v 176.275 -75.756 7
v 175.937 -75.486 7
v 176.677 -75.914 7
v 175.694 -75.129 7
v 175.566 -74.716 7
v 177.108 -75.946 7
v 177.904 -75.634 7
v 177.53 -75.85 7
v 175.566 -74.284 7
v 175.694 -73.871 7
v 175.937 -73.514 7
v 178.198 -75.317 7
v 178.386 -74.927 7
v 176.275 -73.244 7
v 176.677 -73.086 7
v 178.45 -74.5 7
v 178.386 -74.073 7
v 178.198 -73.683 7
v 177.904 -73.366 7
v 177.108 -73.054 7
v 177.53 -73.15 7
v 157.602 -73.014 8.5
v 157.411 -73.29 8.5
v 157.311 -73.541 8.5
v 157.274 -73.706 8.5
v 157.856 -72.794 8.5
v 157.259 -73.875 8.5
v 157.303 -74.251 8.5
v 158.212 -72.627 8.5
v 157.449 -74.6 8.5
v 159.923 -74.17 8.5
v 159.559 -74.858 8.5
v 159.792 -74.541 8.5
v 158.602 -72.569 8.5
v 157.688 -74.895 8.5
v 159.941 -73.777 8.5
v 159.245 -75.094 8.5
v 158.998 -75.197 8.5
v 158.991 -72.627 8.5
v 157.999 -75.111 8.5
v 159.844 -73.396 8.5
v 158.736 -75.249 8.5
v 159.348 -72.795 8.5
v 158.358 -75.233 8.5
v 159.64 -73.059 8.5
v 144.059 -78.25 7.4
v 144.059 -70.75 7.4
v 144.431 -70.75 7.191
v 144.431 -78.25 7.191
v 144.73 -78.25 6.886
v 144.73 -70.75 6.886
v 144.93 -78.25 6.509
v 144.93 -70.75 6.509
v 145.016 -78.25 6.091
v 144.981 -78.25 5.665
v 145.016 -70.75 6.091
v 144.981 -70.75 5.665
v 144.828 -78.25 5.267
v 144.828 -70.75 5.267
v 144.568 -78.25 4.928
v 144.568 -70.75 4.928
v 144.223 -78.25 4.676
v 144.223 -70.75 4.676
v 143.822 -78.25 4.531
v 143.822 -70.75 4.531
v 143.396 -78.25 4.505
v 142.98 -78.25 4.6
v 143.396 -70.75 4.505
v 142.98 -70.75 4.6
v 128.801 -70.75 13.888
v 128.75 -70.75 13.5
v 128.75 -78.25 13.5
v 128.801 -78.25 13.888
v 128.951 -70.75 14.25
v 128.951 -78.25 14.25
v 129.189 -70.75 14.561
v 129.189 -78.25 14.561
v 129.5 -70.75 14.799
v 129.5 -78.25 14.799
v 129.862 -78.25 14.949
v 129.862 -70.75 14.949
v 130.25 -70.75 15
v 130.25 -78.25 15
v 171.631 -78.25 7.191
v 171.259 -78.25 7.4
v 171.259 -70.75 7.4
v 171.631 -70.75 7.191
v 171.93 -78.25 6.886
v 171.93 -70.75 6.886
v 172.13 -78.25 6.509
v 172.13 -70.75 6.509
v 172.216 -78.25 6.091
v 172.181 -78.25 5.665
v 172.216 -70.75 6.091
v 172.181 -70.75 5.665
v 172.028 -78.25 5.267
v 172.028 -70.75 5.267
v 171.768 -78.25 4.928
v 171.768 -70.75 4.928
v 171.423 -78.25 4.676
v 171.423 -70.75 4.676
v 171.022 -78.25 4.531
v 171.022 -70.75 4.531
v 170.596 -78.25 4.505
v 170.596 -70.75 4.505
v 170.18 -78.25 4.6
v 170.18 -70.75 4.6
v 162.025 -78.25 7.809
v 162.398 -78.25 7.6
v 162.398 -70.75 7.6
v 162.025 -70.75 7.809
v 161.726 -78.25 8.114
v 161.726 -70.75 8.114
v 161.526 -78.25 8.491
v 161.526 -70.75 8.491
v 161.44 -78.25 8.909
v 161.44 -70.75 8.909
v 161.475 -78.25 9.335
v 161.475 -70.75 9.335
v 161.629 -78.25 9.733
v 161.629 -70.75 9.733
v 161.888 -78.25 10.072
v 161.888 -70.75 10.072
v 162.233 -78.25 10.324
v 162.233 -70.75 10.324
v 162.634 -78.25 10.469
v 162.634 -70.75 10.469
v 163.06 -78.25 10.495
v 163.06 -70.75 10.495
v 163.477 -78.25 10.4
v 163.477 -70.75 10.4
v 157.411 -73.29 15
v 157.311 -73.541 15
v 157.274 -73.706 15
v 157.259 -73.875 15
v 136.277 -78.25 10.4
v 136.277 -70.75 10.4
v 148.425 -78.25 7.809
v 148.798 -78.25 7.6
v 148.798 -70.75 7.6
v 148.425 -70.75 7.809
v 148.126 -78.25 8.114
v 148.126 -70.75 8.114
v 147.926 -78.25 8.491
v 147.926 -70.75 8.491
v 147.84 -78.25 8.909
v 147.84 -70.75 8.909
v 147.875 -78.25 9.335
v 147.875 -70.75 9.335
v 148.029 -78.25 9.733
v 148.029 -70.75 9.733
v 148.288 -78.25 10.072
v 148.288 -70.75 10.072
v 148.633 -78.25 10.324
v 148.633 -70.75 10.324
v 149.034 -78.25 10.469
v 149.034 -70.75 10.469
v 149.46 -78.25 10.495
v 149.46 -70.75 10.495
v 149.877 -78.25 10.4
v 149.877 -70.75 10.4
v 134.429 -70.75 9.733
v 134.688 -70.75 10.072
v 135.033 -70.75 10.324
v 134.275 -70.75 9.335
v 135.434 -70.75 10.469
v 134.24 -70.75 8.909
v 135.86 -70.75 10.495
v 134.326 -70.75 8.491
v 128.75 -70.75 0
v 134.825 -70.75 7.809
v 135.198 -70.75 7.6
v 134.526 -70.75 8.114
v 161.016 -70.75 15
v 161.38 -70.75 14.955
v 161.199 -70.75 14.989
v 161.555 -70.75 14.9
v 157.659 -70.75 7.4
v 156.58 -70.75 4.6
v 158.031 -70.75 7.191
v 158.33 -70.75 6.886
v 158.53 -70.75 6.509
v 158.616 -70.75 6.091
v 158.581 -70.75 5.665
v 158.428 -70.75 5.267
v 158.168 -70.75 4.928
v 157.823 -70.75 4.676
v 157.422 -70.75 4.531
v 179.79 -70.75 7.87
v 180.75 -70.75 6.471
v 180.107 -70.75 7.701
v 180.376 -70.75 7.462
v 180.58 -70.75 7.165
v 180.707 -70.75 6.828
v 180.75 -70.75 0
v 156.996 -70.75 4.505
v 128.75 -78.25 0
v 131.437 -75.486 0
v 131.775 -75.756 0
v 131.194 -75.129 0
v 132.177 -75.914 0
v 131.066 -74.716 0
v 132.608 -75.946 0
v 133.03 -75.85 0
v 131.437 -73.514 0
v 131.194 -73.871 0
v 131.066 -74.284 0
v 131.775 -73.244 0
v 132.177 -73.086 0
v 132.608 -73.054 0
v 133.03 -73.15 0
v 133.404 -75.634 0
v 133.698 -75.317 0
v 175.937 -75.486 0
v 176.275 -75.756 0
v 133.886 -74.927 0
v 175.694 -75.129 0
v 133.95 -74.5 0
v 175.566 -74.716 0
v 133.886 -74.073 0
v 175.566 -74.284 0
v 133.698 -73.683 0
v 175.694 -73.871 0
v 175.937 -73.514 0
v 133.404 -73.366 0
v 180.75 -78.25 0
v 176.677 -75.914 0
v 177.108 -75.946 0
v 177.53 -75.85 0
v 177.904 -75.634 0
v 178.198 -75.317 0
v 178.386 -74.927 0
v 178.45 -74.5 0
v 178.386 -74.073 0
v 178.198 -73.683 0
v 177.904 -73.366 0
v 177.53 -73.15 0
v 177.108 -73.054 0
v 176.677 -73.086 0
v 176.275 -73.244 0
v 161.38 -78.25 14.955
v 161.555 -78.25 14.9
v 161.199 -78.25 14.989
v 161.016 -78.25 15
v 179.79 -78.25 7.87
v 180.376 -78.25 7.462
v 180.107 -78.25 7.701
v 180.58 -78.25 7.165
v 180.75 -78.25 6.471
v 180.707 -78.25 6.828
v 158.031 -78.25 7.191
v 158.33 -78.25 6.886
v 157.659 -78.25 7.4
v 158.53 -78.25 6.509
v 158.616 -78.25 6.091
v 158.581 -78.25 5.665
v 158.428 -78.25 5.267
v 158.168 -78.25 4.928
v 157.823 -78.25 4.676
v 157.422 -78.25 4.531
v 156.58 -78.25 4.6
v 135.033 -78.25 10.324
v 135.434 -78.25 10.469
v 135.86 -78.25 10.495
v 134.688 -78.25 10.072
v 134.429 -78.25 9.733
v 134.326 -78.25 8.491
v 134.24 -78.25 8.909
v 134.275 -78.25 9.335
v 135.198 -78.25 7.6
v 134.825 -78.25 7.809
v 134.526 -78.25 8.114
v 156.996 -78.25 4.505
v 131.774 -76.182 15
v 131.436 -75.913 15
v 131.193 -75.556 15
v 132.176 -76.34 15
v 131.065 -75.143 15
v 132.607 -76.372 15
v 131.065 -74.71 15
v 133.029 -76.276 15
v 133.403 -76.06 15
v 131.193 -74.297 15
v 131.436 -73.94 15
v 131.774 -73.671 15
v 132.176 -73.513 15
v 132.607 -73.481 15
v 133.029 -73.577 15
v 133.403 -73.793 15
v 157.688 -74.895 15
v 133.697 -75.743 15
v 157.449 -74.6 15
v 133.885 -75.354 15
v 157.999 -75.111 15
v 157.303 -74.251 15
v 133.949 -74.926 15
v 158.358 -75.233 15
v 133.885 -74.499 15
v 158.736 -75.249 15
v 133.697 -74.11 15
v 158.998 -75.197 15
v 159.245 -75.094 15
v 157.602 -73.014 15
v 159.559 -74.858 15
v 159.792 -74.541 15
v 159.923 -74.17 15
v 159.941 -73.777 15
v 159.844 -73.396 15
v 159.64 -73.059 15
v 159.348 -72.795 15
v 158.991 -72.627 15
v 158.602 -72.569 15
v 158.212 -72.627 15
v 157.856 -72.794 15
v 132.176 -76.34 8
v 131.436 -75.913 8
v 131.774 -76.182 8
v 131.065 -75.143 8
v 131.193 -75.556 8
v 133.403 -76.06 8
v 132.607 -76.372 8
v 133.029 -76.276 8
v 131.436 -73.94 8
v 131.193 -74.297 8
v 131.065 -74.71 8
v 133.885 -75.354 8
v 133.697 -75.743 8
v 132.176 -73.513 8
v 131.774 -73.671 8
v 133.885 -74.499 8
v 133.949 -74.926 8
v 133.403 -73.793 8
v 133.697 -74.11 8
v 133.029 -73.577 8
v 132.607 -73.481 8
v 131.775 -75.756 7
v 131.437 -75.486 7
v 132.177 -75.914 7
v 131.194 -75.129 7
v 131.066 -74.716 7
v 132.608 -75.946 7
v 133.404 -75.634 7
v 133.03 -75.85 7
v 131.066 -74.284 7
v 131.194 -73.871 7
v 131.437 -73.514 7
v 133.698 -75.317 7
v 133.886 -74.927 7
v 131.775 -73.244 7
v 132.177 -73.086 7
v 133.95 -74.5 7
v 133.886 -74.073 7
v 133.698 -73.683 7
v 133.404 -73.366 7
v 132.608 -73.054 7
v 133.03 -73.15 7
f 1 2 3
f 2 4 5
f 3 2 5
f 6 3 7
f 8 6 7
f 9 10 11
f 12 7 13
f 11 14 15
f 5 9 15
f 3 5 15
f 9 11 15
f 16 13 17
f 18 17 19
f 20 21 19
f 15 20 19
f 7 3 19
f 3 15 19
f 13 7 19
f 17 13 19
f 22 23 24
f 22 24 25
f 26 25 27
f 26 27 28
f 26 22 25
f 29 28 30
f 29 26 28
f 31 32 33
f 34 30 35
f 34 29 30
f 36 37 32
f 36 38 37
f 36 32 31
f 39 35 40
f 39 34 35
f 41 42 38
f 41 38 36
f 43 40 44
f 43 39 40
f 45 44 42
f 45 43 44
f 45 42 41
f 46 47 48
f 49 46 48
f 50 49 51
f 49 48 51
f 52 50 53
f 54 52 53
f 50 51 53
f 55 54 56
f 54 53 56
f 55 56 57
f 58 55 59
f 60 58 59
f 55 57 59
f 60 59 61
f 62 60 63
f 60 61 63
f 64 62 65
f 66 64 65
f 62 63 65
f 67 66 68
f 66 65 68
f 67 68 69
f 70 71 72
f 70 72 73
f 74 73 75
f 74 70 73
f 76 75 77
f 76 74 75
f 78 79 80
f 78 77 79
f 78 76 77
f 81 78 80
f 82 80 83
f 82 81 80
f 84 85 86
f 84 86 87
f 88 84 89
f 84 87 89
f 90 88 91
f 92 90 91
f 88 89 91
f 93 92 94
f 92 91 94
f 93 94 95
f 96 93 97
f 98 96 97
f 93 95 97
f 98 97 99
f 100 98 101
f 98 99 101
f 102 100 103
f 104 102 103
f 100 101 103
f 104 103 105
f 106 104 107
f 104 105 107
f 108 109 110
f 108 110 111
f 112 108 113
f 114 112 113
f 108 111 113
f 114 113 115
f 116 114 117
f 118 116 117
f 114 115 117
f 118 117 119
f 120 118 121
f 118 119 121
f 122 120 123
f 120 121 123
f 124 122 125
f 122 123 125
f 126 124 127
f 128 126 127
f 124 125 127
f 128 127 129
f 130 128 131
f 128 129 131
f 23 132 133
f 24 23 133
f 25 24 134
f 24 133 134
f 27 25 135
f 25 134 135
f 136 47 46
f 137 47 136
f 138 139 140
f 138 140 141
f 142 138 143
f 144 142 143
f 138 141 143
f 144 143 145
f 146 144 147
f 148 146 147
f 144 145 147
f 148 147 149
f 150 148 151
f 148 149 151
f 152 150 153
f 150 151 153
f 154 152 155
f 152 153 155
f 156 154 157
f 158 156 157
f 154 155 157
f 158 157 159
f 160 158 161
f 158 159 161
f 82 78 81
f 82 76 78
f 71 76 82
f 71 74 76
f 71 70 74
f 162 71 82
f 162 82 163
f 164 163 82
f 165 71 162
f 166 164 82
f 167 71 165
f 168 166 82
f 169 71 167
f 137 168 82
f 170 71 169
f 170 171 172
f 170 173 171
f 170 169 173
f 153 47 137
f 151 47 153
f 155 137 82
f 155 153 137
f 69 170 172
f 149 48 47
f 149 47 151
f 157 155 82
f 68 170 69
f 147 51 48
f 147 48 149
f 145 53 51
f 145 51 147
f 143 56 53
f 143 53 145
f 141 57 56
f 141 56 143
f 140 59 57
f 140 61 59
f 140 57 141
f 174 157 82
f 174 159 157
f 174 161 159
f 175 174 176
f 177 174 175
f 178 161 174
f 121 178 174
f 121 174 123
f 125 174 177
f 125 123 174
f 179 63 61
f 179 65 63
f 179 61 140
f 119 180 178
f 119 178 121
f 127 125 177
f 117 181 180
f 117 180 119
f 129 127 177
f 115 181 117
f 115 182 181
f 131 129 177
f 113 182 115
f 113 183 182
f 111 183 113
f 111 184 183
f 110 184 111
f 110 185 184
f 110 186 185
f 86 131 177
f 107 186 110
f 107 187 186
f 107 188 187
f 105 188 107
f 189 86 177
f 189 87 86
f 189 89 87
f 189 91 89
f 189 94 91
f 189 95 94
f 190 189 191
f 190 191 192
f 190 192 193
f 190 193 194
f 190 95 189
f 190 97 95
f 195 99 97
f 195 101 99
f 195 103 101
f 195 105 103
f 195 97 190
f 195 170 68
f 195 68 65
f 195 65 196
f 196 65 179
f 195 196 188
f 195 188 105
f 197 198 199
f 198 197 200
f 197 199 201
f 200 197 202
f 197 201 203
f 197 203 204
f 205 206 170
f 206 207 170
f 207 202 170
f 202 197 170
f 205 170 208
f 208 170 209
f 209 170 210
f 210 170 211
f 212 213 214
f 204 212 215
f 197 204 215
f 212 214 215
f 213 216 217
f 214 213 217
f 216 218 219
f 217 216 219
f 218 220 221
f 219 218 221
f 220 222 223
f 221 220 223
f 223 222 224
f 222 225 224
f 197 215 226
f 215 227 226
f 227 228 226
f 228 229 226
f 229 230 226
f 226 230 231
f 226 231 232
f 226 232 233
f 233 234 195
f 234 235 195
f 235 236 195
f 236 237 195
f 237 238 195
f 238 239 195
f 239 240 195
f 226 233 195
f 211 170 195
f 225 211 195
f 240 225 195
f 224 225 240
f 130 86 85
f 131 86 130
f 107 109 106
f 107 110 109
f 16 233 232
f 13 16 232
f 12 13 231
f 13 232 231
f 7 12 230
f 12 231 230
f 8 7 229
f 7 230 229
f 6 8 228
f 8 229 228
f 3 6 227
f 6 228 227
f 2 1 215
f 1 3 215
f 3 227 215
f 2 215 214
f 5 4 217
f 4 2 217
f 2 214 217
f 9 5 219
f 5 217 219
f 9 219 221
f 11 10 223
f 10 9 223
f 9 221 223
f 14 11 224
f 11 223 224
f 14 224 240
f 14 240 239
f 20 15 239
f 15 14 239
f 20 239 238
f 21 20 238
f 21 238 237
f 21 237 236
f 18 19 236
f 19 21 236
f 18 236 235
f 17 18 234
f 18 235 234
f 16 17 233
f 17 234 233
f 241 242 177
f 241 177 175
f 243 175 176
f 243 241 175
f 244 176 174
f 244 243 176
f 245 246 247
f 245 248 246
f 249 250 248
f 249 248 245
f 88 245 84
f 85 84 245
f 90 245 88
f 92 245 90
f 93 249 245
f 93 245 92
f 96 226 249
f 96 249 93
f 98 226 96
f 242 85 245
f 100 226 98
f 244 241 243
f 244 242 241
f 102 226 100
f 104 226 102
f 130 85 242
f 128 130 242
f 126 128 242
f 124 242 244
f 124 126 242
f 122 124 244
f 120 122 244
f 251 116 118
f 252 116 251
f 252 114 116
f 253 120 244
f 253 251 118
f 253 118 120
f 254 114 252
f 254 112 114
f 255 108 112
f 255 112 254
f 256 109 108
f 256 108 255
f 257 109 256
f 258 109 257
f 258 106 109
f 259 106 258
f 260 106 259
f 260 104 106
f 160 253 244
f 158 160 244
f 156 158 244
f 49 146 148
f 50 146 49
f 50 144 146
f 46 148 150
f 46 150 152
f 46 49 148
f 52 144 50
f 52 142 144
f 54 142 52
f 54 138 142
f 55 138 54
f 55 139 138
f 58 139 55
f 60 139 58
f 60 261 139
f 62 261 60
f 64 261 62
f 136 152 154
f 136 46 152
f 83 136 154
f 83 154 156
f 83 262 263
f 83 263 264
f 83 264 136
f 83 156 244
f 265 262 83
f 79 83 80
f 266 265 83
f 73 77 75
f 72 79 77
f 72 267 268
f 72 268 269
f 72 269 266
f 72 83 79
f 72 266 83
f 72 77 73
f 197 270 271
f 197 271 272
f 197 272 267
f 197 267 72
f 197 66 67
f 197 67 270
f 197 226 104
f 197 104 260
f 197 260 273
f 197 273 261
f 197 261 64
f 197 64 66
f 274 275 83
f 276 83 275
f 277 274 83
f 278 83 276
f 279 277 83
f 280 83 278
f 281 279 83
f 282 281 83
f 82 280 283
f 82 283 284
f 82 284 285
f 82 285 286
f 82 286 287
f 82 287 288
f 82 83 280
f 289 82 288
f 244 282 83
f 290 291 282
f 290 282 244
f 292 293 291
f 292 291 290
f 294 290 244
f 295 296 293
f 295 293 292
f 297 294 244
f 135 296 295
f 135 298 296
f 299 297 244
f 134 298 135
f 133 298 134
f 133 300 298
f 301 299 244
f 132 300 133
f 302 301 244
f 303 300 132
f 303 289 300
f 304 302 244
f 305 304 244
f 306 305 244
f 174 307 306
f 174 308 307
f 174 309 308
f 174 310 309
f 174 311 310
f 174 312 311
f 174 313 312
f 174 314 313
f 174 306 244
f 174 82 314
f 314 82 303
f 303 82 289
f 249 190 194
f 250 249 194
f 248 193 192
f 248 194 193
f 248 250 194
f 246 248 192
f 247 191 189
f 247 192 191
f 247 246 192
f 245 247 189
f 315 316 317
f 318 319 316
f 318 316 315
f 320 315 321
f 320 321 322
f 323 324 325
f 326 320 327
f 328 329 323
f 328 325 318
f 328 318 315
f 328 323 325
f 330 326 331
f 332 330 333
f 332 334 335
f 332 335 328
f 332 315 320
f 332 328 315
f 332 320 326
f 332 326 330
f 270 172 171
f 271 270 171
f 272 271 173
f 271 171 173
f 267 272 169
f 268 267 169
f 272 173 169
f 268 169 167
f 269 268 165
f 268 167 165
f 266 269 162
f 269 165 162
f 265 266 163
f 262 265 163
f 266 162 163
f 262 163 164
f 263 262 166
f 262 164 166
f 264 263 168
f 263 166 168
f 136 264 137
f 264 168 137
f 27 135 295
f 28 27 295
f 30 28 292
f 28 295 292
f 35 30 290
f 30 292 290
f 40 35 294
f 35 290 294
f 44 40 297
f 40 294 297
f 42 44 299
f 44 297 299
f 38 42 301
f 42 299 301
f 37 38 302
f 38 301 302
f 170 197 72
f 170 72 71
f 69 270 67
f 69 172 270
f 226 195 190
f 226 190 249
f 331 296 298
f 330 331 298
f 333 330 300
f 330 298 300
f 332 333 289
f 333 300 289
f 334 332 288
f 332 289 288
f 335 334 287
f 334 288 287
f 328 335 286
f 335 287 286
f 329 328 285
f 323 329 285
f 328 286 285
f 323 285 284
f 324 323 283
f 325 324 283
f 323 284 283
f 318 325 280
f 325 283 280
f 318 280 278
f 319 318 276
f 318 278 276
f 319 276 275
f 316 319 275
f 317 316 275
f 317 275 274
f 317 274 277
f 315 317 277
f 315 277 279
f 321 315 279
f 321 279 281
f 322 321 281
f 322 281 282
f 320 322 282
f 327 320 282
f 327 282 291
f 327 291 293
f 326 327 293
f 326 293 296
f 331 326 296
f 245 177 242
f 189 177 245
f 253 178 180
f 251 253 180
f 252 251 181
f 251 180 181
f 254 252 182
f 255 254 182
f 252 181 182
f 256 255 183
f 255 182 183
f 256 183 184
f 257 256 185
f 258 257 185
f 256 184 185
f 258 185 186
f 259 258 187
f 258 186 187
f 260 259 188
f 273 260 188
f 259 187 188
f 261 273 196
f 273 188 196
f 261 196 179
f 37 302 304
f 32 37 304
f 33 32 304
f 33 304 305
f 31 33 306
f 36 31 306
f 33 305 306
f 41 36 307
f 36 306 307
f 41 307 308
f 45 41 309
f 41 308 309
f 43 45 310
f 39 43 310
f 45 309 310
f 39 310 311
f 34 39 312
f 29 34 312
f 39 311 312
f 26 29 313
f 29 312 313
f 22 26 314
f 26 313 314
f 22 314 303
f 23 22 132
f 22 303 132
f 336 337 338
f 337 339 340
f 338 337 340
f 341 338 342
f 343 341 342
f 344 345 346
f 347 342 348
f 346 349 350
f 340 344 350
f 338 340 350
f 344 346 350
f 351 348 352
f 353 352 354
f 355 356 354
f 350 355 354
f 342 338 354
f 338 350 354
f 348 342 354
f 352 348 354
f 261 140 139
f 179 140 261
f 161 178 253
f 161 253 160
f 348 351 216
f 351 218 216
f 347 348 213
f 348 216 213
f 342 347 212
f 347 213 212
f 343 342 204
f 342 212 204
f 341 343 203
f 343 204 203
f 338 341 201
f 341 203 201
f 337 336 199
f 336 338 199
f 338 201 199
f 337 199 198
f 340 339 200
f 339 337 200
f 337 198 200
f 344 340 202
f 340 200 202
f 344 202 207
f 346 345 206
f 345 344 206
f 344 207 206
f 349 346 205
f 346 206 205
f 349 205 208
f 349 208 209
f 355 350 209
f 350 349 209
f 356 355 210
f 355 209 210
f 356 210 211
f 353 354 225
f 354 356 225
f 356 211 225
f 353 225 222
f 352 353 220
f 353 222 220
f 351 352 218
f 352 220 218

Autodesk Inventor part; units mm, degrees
ref_plane "YZ Plane" through (0, 0, 0) normal (1, 0, 0) x (0, 1, 0)
ref_plane "XZ Plane" through (0, 0, 0) normal (0, 1, 0) x (-1, 0, 0)
ref_plane "XY Plane" through (0, 0, 0) normal (0, 0, 1) x (1, 0, 0)
ref_plane "Work Plane1" through (0, 0, 0) normal (0, 0, 1) x (1, 0, 0)
sketch "Sketch1" plane through (0, 0, 0) normal (0, 0, 1) x (1, 0, 0)
  circle A0 centre (132.5, -74.5) radius 1.45 projected
  circle A1 centre (177, -74.5) radius 1.45 projected
  line L0 (128.75, -70.75) -> (180.75, -70.75)
  line L1 (180.75, -70.75) -> (180.75, -78.25)
  line L2 (180.75, -78.25) -> (128.75, -78.25)
  line L3 (128.75, -78.25) -> (128.75, -70.75)
  circle A2 centre (132.5, -74.5) radius 1.45
  circle A3 centre (177, -74.5) radius 1.45
  point P0 (0, 0)
  dimension "d0" = 3.75
  dimension "d1" = 3.75
  dimension "d2" = 3.75
  dimension "d3" = 3.75
extrude "Extrusion1" add sketch "Sketch1" along normal blind 15
sketch "Sketch2" plane through (0, 0, 15) normal (0, 0, 1) x (1, 0, 0)
  line L0 (128.75, -78.25) -> (180.75, -78.25) projected
  line L1 (180.75, -78.25) -> (180.75, -70.75) projected
  line L2 (180.75, -70.75) -> (128.75, -70.75) projected
  line L3 (128.75, -70.75) -> (128.75, -78.25) projected
  circle A0 centre (177, -74.5) radius 1.45 projected
  circle A1 centre (132.5, -74.5) radius 1.45 projected
  circle A2 centre (177, -74.5) radius 1.45
  circle A3 centre (132.5, -74.5) radius 1.45
  point P0 (0, 0)
extrude "Extrusion2" add sketch "Sketch2" against normal blind 8 contours A1
sketch "Sketch4" plane through (0, 0, 15) normal (0, 0, 1) x (1, 0, 0)
  circle A0 centre (177, -74.5) radius 1.45 projected
  circle A1 centre (177, -74.5) radius 1.45
  point P0 (0, 0)
extrude "Extrusion3" add sketch "Sketch4" against normal blind 8
sketch "Sketch5" plane through (128.75, -70.75, 0) normal (0, 1, 0) x (1, 0, 0)
  line L0 (52, 0) -> (0, 0) projected
  line L1 (0, 0) -> (0, -15) projected
  line L2 (52, -15) -> (0, -15) projected
  line L3 (52, 0) -> (52, -15) projected
  line L4 (52, -15) -> (0, -15)
  line L5 (0, -15) -> (0, 0)
  line L6 (0, 0) -> (52, 0)
  line L7 (52, 0) -> (52, -15)
  line L8 (52, -15) -> (0, -15) projected
  line L9 (27.805, -15) -> (30.495, -15) projected
  line L10 (30.495, -16) -> (27.805, -16) projected
  line L11 (30.495, -16) -> (30.495, -15)
  line L12 (27.805, -16) -> (27.805, -15)
  line L13 (0, -15) -> (52, -15) projected
  line L14 (32.545, -15) -> (52, -7.5)
  line L15 (52, 0) -> (52, -15) projected
  line L16 (41.9691, -6) -> (34.1871, -9) construction
  line L17 (42.5086, -7.3996) -> (34.7266, -10.3996)
  line L18 (33.6475, -7.6004) -> (41.4295, -4.6004)
  arc A0 (42.5086, -7.3996) -> (41.4295, -4.6004) centre (41.9691, -6) ccw
  arc A1 (33.6475, -7.6004) -> (34.7266, -10.3996) centre (34.1871, -9) ccw
  line L19 (20.0475, -7.6004) -> (27.8295, -4.6004)
  arc A2 (20.0475, -7.6004) -> (21.1266, -10.3996) centre (20.5871, -9) ccw
  line L20 (28.9086, -7.3996) -> (21.1266, -10.3996)
  arc A3 (28.9086, -7.3996) -> (27.8295, -4.6004) centre (28.3691, -6) ccw
  line L21 (-13.6, 0) -> (38.4, 0)
  line L22 (6.4475, -7.6004) -> (14.2295, -4.6004)
  arc A4 (6.4475, -7.6004) -> (7.5266, -10.3996) centre (6.9871, -9) ccw
  line L23 (15.3086, -7.3996) -> (7.5266, -10.3996)
  arc A5 (15.3086, -7.3996) -> (14.2295, -4.6004) centre (14.7691, -6) ccw
  line L24 (-27.2, 0) -> (24.8, 0)
  point P0 (-128.75, 0)
  point P1 (38.0781, -7.5)
  point P2 (52, -7.5)
  point P3 (32.545, -15)
  dimension "d15" = 2.05
  dimension "d21" = 6
  dimension "d22" = 6
  dimension "d23" = 1.5
  dimension "d26" = 13.6
sketch "Sketch6" plane through (0, 0, 15) normal (0, 0, 1) x (1, 0, 0)
  circle A0 centre (132.5, -74.5) radius 1.45 projected
  line L0 (128.75, -78.25) -> (180.75, -78.25) projected
  line L1 (180.75, -78.25) -> (180.75, -70.75) projected
  line L2 (180.75, -70.75) -> (128.75, -70.75) projected
  line L3 (128.75, -70.75) -> (128.75, -78.25) projected
  circle A1 centre (132.499, -74.9265) radius 1.45
  point P0 (0, 0)
  point P1 (132.5, -74.5)
  dimension "d10" = 2.9
  dimension "d14" = 0.4265
extrude "Extrusion4" cut sketch "Sketch6" against normal blind 7 contours A1 A0 | A0 A1 picked at (132.385, -75.1117) picked at (132.6881, -76.0727)
extrude "Extrusion5" cut sketch "Sketch5" against normal blind 8 contours L3 L2 L14 | L17 A1 L18 A0 | L19 A3 L20 A2 | L22 A5 L23 A4
fillet "Fillet1" radius 1.5 3 edges at (180.75, -74.5, 7.5) (161.295, -74.5, 15) (128.75, -74.5, 15)
sketch "Sketch8" plane through (0, 0, 15) normal (0, 0, 1) x (1, 0, 0)
  circle A0 centre (157.9, -75.0575) radius 1.345
  ellipse E0 centre (158.6032, -73.9122) end of major axis (157.4109, -73.2898) minor radius 1.3427 projected
  point P0 (0, 0)
extrude "Extrusion7" cut sketch "Sketch8" against normal blind 6.5 contours A0 E0 | A0 E0 picked at (158.3944, -74.3129) picked at (159.1018, -73.1783)
properties part number "PCB-LNA_Print_CPY"
